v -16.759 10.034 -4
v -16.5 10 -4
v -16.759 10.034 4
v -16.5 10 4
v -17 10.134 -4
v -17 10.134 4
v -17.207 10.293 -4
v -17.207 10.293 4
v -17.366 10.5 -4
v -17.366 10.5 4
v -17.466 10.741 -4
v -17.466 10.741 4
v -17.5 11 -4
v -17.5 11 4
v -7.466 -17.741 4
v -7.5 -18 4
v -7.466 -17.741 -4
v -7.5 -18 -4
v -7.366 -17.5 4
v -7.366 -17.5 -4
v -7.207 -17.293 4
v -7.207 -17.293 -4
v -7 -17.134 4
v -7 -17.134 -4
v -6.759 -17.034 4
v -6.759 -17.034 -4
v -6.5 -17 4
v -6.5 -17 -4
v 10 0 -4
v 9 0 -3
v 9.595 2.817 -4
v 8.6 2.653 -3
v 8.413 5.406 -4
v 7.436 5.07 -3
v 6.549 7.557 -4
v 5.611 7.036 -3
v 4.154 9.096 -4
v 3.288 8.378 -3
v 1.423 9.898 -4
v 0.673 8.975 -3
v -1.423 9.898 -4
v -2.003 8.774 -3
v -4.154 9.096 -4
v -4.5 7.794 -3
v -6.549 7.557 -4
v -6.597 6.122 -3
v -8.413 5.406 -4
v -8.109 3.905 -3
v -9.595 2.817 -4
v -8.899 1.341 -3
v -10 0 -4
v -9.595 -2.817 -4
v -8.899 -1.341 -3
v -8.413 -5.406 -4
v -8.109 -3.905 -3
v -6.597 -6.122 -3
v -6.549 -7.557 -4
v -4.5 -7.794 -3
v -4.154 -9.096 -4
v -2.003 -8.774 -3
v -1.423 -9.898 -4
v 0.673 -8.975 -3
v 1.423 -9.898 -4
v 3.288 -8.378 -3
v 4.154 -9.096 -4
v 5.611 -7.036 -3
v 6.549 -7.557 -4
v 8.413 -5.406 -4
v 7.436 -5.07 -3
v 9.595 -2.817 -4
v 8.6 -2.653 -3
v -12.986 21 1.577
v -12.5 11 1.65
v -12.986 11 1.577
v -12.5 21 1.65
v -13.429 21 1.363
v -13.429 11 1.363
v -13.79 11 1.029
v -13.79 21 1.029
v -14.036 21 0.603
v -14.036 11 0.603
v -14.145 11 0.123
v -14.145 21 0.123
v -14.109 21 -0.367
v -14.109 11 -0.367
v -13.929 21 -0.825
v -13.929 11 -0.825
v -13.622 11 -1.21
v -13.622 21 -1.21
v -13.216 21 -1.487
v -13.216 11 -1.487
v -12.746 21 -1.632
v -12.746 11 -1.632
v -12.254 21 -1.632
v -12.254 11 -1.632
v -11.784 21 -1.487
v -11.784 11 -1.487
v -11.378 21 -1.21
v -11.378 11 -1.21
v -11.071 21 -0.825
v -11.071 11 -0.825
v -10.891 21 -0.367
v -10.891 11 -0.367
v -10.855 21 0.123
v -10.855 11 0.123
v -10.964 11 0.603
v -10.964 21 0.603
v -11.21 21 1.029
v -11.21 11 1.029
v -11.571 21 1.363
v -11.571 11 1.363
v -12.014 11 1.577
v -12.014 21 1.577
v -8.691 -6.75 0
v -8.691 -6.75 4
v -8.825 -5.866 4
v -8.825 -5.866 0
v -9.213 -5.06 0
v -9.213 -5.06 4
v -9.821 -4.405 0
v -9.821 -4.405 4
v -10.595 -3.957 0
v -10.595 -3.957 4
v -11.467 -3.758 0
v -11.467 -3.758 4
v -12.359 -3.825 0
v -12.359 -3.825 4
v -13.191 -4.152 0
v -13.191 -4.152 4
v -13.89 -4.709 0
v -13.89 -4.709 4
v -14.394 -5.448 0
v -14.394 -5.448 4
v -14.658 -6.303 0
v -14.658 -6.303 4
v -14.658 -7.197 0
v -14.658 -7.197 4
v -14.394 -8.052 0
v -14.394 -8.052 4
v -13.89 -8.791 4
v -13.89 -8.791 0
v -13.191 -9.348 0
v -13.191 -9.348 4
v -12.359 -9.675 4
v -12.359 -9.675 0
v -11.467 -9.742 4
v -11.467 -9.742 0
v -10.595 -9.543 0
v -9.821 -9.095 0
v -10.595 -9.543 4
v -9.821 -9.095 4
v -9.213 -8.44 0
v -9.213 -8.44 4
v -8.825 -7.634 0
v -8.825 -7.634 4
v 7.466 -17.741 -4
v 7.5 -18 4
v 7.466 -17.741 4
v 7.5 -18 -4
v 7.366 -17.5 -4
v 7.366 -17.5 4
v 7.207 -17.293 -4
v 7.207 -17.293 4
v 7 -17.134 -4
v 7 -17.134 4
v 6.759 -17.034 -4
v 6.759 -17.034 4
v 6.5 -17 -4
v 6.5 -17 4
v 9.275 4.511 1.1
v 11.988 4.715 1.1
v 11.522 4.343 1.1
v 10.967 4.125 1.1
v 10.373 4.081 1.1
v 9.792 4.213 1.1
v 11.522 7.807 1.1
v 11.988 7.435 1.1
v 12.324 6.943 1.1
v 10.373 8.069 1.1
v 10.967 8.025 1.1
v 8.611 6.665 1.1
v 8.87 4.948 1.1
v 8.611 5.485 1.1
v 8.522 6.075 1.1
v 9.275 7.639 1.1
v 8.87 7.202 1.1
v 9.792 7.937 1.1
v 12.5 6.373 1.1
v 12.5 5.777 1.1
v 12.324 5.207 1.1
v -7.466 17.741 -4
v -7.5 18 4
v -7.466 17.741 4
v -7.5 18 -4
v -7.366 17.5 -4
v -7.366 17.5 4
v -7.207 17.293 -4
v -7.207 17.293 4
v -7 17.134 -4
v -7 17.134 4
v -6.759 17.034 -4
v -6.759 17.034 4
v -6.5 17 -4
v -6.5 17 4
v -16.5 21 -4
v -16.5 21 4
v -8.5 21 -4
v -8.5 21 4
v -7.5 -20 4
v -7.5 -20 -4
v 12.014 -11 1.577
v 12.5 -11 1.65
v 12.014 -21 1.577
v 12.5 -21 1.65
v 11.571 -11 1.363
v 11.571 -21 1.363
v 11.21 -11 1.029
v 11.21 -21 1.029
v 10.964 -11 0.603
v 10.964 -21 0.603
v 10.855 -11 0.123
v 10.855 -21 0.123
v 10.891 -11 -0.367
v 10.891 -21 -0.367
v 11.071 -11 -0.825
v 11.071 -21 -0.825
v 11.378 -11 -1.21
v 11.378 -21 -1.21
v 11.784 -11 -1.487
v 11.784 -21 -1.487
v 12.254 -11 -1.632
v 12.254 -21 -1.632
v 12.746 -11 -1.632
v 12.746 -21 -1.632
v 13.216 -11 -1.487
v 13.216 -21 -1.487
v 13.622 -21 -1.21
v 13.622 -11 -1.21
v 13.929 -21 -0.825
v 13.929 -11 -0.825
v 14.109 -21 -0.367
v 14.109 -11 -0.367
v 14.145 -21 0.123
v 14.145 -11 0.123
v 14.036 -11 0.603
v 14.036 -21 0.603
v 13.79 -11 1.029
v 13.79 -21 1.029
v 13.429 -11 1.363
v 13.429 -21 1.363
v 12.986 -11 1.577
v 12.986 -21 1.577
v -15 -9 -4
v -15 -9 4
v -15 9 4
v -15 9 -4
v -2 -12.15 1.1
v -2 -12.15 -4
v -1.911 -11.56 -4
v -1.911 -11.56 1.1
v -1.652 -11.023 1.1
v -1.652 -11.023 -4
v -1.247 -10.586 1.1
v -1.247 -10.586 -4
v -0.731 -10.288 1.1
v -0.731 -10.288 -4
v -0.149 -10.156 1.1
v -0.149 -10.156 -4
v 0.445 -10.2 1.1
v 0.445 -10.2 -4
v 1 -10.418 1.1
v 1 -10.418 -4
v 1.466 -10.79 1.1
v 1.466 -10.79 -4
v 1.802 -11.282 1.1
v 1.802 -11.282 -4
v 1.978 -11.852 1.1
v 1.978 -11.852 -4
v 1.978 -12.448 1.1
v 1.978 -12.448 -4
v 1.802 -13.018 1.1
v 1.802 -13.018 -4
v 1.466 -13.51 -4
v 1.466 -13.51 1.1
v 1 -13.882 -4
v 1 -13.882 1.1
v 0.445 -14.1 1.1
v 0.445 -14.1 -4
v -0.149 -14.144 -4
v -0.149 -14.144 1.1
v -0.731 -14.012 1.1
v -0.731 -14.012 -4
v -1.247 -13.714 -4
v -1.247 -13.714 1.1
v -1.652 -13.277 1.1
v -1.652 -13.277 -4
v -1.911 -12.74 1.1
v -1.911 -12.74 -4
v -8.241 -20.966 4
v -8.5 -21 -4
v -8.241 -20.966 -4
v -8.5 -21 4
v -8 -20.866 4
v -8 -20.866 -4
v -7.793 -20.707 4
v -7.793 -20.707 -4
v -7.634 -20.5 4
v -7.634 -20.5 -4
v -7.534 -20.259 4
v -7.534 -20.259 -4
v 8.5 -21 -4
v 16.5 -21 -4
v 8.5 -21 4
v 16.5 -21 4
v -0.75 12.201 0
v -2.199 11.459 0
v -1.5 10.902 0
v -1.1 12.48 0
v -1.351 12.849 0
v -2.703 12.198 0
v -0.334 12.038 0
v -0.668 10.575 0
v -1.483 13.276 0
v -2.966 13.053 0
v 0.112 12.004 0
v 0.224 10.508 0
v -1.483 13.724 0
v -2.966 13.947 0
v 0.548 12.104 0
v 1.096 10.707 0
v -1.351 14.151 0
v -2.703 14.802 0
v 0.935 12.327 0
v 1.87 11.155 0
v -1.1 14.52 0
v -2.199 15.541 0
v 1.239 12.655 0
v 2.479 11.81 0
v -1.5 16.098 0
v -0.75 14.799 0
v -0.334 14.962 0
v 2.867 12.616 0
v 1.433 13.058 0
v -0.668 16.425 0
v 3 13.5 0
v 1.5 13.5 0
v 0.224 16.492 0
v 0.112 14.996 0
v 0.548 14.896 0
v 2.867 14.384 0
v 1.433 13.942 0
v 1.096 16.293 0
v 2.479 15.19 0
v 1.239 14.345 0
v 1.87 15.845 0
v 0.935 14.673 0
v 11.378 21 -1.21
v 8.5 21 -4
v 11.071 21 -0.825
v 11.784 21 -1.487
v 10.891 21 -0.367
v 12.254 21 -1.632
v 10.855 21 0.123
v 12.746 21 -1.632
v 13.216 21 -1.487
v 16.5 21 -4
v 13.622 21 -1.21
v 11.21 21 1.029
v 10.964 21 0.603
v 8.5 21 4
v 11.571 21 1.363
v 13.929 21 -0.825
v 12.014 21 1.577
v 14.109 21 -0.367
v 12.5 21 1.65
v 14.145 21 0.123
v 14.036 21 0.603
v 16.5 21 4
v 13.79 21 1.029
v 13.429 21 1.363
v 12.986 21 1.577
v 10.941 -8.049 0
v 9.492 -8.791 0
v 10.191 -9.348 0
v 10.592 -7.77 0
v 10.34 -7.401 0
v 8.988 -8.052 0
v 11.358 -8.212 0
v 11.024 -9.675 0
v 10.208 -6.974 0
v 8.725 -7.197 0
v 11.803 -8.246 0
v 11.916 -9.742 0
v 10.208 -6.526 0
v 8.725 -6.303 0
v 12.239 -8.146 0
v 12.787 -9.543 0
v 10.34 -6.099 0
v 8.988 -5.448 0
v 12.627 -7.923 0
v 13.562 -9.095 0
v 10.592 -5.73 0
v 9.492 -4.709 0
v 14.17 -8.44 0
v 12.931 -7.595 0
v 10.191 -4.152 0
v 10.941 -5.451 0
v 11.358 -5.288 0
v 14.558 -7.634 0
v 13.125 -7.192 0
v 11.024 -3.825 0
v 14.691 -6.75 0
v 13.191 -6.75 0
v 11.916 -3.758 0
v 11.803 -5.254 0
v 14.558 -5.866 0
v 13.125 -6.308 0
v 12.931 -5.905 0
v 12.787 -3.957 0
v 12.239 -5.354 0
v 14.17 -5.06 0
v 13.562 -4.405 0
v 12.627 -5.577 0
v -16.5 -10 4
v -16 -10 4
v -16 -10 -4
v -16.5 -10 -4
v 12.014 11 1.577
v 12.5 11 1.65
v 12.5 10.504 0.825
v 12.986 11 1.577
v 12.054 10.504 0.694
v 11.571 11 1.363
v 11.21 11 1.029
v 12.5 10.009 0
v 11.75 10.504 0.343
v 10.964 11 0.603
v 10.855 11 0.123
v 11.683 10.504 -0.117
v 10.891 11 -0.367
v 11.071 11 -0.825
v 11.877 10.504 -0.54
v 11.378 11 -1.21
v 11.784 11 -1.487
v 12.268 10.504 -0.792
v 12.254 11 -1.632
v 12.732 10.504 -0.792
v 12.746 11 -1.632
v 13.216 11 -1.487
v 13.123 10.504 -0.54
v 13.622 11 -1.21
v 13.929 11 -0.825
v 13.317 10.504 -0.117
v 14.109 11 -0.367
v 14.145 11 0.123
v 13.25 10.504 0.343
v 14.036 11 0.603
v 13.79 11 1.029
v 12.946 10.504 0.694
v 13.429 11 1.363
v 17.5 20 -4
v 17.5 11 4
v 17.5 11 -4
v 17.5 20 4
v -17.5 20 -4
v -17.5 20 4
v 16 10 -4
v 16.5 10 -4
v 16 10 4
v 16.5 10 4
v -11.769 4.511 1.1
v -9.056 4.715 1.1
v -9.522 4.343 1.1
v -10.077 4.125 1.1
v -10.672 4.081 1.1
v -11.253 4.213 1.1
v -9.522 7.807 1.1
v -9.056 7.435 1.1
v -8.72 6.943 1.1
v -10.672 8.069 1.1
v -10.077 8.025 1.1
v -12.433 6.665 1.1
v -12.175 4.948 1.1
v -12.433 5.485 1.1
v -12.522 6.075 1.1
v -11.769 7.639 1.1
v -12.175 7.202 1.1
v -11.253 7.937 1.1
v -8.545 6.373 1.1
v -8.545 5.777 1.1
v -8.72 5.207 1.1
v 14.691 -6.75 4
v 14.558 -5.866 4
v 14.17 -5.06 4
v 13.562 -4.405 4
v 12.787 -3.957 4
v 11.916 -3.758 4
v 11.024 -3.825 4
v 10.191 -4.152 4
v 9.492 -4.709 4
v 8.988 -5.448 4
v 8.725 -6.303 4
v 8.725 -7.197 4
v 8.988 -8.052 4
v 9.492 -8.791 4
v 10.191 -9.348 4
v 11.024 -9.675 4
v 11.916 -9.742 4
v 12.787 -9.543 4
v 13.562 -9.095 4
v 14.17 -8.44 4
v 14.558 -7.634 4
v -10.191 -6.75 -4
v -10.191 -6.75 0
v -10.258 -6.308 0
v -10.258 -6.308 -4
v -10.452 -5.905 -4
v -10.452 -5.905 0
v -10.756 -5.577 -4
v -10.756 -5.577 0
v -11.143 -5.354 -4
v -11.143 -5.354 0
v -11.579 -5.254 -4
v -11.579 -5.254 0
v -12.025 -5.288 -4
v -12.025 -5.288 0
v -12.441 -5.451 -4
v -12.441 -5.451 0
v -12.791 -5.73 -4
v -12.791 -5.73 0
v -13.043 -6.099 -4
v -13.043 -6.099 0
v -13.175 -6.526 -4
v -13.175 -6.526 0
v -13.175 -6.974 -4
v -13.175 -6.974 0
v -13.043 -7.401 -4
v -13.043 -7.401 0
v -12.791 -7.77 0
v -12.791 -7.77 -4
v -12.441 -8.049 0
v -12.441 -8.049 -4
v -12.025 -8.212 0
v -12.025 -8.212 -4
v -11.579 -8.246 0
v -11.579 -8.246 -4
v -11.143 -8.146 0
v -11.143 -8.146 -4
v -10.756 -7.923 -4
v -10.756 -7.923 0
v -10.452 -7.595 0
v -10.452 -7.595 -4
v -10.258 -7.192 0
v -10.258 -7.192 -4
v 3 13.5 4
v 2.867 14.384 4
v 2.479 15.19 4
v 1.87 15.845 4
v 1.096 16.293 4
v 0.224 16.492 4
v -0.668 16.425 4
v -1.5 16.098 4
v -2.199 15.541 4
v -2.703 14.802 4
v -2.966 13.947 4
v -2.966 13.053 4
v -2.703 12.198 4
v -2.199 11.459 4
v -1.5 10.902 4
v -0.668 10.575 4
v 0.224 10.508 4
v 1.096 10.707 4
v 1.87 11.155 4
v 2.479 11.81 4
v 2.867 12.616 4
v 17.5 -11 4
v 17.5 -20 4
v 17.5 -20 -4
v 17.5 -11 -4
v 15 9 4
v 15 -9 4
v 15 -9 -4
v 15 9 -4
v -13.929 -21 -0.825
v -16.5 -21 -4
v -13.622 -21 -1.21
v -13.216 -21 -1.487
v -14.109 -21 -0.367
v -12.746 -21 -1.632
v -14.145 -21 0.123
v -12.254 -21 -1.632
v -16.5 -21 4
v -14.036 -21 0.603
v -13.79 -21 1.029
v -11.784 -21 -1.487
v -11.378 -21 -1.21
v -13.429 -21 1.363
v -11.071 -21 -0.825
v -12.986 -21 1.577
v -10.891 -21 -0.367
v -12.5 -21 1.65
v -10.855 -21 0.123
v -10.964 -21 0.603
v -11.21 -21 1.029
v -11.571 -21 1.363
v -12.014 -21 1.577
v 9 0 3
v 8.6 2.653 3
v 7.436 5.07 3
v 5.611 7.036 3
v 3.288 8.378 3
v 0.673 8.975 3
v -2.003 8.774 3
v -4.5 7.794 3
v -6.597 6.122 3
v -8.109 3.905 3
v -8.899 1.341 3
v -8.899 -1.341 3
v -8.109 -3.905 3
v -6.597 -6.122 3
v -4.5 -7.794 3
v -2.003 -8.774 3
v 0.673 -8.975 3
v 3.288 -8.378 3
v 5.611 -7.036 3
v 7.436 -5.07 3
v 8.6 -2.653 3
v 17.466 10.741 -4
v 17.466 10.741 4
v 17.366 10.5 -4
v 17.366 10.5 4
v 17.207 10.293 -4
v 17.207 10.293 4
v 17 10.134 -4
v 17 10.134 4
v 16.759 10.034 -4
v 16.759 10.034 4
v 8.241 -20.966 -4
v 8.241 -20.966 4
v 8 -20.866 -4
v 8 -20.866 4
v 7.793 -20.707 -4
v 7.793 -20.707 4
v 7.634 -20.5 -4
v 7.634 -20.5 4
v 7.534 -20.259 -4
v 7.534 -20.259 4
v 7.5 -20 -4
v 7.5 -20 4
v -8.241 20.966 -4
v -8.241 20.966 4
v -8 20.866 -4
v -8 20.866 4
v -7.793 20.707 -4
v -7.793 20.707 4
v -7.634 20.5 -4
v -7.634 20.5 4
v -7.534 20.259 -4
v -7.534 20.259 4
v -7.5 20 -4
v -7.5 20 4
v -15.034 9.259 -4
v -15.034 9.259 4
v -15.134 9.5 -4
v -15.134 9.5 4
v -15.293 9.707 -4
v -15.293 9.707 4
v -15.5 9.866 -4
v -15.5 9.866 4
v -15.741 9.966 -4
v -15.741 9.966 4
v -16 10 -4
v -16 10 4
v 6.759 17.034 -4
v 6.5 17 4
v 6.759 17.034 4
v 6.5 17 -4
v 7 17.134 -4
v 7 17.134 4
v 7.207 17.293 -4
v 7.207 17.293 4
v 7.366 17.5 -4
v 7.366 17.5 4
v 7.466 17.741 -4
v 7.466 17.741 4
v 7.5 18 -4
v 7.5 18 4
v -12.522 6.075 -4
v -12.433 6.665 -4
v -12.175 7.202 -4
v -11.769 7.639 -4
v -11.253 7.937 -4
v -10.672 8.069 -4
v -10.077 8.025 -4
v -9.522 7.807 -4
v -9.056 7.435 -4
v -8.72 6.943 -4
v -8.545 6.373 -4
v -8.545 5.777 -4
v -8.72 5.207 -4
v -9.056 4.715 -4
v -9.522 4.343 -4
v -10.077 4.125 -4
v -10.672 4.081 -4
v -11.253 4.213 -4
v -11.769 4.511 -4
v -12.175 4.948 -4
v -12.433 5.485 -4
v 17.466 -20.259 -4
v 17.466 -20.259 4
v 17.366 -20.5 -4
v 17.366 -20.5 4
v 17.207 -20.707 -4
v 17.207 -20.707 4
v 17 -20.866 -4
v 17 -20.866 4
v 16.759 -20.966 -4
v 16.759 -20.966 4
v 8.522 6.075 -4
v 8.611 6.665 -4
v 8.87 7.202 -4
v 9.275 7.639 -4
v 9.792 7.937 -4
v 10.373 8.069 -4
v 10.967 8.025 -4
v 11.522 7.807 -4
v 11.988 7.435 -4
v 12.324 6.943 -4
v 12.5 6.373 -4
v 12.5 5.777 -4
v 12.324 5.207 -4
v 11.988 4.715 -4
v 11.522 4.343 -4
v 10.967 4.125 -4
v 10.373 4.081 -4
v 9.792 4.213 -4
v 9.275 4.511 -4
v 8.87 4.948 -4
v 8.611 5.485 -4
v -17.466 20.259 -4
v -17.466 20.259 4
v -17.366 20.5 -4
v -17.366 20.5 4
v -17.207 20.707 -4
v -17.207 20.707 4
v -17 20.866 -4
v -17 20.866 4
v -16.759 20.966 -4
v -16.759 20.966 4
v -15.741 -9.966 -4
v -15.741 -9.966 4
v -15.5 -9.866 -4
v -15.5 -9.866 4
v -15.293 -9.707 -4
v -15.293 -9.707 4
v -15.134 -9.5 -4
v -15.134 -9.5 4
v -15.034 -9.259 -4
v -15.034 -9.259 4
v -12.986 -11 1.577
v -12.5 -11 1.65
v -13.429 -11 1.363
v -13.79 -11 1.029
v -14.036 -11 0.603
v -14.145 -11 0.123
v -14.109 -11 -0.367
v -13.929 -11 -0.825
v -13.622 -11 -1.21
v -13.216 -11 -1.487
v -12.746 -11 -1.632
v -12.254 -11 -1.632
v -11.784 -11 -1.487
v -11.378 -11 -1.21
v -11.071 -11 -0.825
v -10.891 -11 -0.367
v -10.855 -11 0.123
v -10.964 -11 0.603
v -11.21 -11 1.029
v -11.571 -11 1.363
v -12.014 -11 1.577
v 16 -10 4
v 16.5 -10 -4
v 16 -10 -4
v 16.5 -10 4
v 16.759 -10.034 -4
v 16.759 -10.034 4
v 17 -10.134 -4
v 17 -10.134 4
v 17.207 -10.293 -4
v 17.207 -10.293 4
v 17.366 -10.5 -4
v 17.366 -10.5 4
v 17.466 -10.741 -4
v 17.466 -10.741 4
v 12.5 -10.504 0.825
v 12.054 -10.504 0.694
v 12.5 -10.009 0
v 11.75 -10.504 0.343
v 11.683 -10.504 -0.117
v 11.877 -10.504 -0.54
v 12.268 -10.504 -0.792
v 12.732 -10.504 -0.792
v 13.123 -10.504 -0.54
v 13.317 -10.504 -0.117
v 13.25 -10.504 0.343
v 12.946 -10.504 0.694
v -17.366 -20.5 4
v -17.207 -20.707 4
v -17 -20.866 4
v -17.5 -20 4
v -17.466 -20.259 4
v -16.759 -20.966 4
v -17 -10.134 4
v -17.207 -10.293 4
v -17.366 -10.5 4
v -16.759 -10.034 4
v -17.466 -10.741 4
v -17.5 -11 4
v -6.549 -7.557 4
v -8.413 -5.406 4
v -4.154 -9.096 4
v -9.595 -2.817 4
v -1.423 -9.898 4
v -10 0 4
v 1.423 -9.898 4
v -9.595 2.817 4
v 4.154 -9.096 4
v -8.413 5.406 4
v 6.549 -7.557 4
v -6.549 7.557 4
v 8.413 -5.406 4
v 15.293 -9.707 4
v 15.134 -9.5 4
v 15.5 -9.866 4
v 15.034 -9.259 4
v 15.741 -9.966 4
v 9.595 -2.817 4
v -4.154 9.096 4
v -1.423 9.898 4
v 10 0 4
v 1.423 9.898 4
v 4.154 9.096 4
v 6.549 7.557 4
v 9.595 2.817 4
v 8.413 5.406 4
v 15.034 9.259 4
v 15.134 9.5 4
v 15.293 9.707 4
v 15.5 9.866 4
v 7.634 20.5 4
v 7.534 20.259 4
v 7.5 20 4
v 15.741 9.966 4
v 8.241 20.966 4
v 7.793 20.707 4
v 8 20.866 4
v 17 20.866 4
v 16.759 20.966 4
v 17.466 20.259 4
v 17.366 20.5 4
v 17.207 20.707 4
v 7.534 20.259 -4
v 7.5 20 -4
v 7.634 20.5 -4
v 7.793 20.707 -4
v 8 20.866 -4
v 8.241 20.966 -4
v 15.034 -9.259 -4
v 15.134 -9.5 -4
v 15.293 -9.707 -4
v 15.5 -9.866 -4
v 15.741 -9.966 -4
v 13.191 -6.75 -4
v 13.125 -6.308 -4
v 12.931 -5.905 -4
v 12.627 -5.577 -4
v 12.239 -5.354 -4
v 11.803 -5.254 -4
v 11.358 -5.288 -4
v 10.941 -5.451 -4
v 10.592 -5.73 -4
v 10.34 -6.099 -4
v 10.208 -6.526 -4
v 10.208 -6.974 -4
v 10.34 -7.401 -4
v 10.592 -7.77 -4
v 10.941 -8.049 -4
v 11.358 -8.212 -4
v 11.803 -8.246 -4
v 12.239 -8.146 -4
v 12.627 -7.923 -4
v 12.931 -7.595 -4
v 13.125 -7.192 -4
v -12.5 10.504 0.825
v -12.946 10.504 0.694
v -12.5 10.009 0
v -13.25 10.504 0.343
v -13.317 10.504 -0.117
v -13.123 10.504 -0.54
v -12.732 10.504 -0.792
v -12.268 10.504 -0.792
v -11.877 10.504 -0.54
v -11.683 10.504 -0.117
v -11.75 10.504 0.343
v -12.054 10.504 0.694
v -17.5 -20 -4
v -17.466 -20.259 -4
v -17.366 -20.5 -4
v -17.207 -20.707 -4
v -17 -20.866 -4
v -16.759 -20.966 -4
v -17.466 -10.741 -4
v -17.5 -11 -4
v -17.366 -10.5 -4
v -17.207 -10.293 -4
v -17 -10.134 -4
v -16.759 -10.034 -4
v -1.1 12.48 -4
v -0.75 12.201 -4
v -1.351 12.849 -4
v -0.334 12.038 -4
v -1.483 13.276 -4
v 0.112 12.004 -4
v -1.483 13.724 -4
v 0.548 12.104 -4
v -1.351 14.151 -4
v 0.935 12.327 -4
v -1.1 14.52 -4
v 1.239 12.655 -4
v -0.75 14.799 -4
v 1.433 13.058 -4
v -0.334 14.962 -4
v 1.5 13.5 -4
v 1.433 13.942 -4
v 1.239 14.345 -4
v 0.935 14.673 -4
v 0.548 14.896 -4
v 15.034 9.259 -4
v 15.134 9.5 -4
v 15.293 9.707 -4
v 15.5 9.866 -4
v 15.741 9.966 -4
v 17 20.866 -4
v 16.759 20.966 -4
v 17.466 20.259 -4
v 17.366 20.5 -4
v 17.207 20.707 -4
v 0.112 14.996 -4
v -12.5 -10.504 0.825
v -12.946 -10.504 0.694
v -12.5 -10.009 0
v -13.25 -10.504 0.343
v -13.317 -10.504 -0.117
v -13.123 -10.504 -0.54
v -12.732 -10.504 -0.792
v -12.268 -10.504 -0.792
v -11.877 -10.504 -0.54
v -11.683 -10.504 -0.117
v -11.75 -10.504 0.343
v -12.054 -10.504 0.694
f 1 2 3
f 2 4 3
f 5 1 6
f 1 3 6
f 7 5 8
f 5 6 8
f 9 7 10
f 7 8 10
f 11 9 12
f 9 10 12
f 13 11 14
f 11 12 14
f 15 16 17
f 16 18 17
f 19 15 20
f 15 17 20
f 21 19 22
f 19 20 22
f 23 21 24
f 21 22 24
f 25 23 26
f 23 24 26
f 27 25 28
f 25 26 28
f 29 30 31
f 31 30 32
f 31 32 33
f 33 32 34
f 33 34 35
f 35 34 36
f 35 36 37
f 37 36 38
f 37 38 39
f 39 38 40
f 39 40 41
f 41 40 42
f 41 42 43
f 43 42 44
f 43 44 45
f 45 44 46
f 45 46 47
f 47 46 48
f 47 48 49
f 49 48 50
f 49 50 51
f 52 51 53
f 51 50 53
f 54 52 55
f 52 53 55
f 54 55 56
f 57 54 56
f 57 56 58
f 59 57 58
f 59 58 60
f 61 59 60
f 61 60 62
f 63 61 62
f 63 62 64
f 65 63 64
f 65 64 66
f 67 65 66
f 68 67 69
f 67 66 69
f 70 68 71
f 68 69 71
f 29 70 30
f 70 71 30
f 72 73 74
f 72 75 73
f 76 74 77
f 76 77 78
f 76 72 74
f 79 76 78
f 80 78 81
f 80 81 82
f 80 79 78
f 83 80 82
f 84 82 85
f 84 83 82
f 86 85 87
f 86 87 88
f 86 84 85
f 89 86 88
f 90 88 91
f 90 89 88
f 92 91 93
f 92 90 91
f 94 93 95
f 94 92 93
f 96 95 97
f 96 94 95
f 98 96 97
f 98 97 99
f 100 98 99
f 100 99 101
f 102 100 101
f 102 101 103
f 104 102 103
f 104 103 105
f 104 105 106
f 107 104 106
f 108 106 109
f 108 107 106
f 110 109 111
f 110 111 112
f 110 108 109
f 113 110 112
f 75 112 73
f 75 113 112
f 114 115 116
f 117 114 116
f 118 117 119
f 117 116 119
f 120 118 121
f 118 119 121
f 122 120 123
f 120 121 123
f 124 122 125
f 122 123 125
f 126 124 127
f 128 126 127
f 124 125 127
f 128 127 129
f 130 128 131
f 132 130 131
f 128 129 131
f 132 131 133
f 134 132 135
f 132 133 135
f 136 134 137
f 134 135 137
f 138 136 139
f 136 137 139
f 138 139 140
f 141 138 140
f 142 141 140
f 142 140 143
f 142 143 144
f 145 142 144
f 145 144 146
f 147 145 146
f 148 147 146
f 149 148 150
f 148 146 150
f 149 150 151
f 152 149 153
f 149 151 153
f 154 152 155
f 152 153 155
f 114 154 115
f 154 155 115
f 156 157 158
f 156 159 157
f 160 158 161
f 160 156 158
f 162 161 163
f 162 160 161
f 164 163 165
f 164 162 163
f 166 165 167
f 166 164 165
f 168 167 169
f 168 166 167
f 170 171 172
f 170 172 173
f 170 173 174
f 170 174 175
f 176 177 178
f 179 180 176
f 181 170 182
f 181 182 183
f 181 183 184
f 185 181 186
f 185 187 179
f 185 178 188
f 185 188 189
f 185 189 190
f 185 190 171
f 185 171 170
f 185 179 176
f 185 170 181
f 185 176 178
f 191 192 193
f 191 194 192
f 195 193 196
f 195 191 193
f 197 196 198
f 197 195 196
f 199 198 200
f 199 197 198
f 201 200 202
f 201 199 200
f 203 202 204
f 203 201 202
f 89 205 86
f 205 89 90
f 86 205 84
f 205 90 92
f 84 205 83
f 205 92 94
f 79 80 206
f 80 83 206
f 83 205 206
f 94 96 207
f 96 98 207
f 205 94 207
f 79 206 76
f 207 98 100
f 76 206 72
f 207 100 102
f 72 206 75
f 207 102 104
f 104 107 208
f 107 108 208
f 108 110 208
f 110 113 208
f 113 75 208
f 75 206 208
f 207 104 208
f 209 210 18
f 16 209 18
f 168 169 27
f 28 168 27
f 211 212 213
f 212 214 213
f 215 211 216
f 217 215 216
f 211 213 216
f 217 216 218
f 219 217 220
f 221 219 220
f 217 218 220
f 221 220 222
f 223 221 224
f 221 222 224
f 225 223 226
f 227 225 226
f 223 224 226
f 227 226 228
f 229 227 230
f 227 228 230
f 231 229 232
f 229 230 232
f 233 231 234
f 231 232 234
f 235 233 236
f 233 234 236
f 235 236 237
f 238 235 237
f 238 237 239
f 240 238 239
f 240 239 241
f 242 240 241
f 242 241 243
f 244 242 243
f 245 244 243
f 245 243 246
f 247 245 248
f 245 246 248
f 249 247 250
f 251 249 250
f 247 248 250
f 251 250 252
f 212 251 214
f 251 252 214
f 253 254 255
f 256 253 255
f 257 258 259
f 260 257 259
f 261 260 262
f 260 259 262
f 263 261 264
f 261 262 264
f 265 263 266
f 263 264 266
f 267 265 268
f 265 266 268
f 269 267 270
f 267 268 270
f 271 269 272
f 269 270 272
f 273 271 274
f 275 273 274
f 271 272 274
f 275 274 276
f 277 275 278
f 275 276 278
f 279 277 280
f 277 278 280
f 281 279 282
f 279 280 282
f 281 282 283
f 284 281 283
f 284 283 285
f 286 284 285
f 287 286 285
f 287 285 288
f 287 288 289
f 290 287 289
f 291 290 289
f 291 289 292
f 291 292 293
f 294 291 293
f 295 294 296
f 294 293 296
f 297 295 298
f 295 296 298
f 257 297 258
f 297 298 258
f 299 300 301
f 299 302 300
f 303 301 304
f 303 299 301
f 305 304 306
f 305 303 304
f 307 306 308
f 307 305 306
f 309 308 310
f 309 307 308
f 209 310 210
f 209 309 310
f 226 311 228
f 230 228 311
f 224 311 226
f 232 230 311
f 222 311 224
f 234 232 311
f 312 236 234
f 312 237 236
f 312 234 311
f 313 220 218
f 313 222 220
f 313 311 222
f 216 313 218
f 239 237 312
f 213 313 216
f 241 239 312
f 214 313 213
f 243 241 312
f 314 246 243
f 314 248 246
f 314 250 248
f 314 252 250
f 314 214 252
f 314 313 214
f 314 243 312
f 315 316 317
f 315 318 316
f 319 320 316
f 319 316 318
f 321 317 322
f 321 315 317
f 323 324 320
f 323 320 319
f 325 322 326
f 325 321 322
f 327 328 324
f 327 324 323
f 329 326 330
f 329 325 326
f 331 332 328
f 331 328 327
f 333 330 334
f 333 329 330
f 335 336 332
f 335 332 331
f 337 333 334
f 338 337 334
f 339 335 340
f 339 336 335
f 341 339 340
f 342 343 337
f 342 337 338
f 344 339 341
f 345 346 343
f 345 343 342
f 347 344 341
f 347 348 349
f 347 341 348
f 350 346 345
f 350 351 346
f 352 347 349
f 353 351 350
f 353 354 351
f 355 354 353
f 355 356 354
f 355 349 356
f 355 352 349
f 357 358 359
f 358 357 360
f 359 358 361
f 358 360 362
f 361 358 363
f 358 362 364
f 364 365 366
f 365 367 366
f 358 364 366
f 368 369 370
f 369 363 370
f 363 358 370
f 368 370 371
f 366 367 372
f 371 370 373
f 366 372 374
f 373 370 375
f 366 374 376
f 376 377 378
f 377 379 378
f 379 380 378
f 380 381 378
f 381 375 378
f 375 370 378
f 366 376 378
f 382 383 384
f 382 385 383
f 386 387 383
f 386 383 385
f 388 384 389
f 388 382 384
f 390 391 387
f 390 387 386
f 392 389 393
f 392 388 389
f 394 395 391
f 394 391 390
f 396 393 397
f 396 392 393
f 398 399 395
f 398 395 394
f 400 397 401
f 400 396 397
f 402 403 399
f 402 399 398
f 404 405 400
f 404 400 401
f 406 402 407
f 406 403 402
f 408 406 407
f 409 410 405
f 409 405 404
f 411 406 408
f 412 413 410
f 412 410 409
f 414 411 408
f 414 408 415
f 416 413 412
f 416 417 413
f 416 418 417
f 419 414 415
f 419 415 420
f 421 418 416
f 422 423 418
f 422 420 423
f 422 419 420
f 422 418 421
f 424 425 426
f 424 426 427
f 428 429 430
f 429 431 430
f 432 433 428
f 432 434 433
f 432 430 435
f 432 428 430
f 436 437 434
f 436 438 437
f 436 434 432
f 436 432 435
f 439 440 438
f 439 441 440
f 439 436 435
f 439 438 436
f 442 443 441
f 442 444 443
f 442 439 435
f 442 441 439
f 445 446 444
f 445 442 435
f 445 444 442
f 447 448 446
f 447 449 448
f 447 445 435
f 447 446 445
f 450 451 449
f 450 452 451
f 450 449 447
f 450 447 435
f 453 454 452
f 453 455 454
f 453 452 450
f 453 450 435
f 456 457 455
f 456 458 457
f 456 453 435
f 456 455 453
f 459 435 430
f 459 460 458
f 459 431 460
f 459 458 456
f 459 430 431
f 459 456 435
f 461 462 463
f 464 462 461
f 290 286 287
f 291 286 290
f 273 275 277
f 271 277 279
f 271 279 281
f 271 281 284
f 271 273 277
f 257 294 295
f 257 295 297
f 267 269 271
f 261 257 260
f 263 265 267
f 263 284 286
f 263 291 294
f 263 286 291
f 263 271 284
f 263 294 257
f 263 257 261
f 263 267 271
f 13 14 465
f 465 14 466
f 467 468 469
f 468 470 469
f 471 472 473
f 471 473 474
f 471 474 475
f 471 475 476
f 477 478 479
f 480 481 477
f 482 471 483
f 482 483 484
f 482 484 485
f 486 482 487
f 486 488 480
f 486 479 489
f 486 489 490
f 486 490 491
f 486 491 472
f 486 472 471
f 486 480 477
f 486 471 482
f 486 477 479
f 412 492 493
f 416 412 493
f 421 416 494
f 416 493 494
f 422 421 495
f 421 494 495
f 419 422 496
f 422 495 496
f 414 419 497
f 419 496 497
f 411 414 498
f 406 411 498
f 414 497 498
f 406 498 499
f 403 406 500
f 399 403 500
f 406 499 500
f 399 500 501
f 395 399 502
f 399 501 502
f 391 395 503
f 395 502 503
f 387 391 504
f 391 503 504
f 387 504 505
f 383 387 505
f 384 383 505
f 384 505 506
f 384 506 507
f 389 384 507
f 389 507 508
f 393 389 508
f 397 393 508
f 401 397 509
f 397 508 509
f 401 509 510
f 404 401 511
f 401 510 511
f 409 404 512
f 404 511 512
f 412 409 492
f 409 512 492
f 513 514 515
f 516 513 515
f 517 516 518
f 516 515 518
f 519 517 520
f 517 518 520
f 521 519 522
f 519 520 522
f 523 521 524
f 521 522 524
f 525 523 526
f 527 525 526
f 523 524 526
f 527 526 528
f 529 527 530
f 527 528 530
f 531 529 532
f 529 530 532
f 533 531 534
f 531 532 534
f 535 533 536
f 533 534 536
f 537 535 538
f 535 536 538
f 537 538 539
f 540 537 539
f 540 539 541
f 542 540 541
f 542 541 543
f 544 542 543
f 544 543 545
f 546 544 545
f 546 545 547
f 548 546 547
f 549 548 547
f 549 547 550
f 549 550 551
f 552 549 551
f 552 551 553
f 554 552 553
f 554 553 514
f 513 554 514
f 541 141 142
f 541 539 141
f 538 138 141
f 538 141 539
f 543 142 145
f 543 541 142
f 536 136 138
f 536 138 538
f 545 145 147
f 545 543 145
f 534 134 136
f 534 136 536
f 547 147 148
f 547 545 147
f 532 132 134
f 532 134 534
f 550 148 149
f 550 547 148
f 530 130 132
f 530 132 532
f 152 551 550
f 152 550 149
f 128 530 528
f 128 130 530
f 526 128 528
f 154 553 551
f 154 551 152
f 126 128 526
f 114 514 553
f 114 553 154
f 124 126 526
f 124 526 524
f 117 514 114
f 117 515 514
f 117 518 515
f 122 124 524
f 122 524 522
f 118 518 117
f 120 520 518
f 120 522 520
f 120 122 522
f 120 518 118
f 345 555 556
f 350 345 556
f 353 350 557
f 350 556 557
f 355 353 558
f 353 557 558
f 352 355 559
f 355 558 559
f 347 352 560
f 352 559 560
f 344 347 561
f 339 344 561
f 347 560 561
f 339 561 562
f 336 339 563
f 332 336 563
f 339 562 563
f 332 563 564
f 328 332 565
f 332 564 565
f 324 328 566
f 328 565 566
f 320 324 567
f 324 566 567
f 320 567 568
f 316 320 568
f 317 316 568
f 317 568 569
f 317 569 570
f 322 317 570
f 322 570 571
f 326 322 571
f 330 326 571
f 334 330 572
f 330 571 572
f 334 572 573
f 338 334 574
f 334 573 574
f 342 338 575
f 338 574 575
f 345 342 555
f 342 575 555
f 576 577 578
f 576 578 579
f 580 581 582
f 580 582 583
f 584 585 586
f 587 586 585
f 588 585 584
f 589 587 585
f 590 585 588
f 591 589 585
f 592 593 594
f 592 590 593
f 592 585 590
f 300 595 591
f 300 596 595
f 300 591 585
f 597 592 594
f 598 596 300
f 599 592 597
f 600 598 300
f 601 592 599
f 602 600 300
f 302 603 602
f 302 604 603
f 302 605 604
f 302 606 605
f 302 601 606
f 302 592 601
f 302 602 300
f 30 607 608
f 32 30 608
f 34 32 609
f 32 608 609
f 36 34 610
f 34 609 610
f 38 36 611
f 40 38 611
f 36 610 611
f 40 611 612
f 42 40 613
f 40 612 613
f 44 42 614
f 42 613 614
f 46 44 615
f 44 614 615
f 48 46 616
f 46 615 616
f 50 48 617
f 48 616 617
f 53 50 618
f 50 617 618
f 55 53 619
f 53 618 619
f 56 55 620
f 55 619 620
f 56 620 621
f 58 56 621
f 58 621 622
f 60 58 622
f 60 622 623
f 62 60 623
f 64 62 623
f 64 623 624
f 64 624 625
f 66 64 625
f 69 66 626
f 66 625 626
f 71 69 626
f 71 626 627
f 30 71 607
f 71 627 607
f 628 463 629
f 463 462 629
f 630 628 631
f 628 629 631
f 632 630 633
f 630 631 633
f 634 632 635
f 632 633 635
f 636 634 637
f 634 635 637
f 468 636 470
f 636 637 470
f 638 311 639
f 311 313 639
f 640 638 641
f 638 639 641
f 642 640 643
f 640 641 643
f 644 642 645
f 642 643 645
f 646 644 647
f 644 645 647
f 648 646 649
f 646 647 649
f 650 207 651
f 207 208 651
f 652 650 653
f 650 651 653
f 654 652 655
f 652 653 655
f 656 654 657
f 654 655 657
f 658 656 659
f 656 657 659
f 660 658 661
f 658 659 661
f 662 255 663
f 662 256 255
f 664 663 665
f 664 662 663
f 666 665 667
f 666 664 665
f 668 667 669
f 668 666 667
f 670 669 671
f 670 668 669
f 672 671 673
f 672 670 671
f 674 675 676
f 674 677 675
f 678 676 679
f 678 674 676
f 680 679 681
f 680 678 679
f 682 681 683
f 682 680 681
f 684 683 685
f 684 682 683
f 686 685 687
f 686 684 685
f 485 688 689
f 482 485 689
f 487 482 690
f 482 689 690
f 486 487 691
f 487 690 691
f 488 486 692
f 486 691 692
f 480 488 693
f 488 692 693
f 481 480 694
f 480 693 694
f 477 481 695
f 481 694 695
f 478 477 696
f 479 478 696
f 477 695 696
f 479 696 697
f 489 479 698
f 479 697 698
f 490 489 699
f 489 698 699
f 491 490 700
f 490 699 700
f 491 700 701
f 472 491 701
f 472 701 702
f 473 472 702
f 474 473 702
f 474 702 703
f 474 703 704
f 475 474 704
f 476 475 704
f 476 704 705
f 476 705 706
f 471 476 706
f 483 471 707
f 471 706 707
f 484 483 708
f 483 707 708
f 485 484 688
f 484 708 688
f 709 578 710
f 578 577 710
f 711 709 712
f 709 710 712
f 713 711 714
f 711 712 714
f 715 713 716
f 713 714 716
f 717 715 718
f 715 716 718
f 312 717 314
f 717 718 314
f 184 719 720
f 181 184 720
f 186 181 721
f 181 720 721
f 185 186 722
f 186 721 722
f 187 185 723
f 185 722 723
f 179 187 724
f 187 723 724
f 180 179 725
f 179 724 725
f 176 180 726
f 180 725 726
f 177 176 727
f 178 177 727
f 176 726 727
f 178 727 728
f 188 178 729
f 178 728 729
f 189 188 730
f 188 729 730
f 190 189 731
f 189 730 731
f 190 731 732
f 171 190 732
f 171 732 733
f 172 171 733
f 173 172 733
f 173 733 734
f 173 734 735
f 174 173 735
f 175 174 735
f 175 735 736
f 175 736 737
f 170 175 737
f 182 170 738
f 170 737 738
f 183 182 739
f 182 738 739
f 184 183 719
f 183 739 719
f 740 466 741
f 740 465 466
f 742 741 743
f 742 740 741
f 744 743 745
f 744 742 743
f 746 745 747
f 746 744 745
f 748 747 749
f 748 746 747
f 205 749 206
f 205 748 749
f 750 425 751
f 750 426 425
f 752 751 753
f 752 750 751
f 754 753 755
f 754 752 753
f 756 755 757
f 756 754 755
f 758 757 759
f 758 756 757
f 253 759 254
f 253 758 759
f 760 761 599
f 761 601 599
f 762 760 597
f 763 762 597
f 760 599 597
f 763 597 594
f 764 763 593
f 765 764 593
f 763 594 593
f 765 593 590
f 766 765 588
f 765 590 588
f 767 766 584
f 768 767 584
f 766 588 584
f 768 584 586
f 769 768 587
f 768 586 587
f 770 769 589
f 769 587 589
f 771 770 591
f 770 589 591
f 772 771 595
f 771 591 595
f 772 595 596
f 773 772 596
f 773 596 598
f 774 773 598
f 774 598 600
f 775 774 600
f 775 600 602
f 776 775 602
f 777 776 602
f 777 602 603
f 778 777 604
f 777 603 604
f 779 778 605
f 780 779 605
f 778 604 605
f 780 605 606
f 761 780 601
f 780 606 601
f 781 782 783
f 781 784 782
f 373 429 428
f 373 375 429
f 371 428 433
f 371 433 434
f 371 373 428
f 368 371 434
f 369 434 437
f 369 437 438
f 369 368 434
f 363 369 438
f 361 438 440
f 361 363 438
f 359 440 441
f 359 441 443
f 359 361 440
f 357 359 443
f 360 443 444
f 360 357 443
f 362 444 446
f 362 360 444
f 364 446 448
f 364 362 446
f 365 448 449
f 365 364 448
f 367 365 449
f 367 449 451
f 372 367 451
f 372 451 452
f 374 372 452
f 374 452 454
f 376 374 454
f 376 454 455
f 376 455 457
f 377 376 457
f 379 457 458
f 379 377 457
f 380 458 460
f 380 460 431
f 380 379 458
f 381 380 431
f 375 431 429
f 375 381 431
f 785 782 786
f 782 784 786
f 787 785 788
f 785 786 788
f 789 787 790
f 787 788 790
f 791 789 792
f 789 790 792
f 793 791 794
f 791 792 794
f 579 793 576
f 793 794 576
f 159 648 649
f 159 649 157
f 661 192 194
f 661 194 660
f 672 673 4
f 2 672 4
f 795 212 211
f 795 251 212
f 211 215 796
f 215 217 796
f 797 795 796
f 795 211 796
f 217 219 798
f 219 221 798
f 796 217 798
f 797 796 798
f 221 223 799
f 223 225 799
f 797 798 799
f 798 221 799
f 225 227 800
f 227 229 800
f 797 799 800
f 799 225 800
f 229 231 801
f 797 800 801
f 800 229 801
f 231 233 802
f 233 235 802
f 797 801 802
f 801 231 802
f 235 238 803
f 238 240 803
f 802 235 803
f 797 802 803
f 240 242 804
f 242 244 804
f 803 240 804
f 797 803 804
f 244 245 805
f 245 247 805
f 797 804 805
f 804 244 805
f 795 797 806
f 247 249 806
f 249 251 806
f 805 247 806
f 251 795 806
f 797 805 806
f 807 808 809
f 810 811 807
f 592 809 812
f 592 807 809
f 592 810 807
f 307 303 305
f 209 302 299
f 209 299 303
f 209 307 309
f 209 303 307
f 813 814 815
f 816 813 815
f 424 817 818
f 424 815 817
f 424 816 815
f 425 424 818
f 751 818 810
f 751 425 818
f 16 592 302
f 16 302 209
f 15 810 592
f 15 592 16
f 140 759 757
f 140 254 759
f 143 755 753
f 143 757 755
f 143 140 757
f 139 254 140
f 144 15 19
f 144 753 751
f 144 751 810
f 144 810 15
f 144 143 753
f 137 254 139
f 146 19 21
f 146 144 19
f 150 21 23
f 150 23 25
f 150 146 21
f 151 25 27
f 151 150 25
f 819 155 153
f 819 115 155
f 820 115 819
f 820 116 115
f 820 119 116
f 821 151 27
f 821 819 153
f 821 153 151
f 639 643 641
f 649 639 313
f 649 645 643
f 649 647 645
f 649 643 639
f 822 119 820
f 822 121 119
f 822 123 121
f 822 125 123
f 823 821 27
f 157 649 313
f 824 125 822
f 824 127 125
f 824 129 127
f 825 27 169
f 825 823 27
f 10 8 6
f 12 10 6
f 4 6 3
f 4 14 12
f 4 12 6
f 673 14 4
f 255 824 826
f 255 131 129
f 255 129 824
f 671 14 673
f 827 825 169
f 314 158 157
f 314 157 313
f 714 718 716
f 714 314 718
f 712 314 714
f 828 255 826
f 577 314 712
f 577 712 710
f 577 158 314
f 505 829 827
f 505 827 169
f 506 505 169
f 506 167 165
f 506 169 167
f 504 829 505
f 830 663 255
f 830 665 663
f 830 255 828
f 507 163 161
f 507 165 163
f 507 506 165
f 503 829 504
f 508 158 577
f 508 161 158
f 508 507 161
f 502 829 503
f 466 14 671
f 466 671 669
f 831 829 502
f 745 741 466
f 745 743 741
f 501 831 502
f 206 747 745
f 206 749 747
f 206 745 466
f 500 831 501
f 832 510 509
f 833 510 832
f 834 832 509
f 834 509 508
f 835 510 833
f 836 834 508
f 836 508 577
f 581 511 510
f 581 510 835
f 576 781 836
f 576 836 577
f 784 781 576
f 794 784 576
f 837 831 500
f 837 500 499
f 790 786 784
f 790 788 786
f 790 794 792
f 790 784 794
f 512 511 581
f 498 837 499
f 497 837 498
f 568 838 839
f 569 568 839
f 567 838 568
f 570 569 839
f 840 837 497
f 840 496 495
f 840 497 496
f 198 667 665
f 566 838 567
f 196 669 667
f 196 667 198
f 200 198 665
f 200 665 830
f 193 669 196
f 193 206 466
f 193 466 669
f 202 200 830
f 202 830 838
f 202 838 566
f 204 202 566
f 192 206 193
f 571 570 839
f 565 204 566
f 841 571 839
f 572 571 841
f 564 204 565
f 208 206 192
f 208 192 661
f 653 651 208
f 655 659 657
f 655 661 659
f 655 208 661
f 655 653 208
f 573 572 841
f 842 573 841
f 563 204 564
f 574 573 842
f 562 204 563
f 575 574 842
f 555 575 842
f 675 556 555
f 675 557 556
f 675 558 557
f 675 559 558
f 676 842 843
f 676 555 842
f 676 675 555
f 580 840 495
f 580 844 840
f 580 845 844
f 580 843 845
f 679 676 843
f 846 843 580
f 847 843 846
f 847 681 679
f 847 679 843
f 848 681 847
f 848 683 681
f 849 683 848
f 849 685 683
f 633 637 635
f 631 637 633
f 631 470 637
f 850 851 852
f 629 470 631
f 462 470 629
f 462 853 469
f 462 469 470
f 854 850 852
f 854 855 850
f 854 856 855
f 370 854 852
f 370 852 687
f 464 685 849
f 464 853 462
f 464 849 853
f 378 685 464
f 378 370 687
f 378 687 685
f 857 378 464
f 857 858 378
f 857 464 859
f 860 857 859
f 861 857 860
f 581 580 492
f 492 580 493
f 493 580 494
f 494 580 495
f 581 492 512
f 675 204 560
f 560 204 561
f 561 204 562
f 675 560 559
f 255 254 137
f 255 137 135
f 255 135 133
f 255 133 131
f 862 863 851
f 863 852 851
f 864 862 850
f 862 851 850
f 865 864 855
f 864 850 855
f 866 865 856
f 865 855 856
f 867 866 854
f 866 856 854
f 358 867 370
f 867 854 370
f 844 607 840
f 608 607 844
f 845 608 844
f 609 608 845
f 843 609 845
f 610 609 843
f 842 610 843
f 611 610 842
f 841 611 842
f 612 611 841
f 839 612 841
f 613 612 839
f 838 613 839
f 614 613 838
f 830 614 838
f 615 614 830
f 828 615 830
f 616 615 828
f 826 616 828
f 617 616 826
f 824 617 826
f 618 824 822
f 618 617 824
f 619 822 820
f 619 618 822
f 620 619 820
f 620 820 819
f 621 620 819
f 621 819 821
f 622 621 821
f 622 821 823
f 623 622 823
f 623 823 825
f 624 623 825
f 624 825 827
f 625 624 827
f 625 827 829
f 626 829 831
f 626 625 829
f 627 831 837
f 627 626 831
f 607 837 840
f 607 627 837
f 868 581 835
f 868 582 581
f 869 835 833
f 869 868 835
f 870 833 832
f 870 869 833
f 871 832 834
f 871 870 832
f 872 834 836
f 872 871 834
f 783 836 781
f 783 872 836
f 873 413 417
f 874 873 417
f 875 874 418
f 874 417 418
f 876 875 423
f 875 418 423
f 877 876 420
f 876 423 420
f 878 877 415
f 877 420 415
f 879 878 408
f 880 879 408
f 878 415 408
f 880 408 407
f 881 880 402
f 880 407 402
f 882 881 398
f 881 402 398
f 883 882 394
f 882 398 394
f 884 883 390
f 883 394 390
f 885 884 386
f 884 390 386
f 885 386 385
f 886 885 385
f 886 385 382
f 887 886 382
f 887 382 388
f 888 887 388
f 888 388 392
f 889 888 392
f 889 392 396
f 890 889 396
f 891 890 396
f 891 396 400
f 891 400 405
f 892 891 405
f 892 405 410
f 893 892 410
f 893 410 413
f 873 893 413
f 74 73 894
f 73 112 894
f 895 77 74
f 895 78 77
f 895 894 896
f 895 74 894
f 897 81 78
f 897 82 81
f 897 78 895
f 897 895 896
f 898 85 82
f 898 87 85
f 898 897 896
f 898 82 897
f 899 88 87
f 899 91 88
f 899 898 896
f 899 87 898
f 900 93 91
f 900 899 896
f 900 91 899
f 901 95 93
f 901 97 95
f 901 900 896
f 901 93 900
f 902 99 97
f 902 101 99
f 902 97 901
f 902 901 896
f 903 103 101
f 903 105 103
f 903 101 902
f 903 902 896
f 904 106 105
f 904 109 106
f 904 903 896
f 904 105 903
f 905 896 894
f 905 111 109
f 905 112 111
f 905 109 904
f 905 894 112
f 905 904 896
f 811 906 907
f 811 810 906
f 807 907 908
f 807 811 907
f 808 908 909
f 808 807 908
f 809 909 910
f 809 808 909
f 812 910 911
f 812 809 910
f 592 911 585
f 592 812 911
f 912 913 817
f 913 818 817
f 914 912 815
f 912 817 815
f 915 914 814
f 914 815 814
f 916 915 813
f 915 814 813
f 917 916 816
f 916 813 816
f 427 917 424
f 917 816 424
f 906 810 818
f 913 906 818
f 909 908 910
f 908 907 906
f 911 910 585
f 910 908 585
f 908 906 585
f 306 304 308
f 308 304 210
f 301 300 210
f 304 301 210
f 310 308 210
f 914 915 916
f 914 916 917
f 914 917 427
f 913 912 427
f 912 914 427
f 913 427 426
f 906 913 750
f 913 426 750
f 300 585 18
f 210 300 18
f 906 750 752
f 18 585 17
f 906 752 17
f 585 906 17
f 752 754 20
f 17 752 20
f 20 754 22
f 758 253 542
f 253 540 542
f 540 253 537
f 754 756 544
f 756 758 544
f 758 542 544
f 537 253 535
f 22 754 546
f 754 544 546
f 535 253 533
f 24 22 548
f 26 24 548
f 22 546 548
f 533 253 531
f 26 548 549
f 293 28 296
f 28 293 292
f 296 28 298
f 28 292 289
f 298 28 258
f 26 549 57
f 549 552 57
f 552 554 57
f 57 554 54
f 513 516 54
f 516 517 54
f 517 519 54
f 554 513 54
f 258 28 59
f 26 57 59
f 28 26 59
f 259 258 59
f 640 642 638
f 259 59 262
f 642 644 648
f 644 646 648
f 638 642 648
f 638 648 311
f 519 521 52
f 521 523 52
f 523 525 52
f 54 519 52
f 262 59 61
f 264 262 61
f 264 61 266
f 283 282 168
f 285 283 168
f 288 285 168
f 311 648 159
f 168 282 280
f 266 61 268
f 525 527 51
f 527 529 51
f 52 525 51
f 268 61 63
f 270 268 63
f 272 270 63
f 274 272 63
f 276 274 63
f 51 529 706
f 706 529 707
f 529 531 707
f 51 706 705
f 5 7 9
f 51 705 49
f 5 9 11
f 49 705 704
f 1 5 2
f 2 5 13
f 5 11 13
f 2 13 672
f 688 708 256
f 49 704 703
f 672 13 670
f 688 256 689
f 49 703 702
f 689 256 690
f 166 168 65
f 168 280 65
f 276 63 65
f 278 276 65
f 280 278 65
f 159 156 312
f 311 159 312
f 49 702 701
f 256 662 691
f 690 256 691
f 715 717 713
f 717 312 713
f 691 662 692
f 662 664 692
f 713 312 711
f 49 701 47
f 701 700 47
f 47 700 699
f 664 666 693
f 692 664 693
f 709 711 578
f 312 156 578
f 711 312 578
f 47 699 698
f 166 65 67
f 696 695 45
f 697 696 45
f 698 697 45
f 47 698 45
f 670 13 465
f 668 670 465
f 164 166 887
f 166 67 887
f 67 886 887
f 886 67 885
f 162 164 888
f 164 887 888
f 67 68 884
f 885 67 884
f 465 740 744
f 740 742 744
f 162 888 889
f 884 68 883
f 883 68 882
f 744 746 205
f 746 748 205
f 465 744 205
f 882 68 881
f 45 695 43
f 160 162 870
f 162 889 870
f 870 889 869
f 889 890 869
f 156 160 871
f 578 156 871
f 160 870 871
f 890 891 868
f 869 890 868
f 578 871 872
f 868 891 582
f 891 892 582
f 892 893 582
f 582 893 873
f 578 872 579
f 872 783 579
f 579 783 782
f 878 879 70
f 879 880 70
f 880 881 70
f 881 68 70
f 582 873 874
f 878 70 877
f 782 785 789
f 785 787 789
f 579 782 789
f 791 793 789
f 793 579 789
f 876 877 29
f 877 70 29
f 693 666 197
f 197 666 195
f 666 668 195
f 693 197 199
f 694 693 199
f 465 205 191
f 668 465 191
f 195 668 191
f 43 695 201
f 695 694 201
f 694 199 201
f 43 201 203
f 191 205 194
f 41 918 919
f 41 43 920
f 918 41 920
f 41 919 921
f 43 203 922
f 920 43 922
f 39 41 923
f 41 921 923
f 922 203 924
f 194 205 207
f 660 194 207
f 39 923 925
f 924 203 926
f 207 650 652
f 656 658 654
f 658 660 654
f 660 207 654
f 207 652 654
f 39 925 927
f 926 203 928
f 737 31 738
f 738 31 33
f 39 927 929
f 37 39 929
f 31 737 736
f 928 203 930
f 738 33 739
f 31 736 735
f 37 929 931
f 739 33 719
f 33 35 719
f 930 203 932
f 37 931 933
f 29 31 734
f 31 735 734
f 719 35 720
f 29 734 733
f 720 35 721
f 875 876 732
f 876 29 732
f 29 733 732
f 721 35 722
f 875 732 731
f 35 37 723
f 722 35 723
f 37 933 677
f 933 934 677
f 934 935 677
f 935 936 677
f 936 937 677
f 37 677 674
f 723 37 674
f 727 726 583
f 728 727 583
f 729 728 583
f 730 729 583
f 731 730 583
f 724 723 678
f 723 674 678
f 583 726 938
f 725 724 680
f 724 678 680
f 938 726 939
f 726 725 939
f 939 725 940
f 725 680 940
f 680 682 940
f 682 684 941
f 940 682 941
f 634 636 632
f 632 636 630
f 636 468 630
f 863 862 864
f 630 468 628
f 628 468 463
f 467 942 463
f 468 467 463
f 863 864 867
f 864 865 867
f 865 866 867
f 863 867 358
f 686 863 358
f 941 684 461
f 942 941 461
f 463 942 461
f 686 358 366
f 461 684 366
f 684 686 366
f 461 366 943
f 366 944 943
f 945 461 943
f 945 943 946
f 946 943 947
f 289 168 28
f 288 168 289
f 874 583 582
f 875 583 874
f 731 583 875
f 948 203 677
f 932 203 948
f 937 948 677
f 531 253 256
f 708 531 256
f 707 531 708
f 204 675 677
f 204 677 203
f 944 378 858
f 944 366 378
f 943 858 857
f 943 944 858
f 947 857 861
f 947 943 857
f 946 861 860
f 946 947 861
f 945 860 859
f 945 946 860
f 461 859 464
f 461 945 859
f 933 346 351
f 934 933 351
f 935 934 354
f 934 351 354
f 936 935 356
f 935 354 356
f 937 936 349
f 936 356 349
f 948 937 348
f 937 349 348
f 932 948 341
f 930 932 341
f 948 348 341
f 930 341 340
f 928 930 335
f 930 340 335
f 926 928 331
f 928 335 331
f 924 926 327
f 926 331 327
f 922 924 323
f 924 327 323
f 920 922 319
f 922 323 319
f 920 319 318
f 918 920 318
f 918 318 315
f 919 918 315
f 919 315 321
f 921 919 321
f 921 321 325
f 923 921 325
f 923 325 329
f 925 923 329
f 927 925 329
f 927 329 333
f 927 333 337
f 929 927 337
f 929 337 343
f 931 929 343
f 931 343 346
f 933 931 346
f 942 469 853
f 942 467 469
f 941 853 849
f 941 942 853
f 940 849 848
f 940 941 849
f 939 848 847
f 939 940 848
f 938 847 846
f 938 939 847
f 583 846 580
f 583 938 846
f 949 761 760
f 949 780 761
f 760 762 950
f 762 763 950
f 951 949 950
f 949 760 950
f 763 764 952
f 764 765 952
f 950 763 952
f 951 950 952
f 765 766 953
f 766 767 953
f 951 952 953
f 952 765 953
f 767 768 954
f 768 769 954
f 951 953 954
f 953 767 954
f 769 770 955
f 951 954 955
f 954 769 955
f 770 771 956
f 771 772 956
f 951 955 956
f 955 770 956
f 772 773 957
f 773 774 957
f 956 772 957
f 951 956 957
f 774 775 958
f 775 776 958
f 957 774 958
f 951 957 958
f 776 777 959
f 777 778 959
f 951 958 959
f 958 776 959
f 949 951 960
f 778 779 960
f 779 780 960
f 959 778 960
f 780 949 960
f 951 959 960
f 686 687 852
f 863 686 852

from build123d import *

# Parameters (mm, degrees)
SKETCH_1_W                  = 35
SKETCH_1_H                  = 42
EXTRUDE_1_DEPTH             = 4
SKETCH_2_R                  = 1.5
SKETCH_2_R_2                = 9
CUT_EXTRUDE_1_DEPTH         = 8
SKETCH_3_R                  = 3
CUT_EXTRUDE_2_DEPTH         = 4
HOLE_WIZARD_M4_1_AT_2_COUNT = 2
HOLE_WIZARD_M4_1_AT_2_PITCH = 25
SKETCH_9_R                  = 2
CUT_EXTRUDE_3_DEPTH         = 5.1
CUT_EXTRUDE_4_DEPTH         = 29.482450737
CUT_EXTRUDE_4_DEPTH_BACK    = 29.482450737
SKETCH_10_W                 = 15
SKETCH_10_H                 = 8
SKETCH_10_W_2               = 5
SKETCH_10_H_2               = 20
FILLET_2_R                  = 1
CHAMFER_1_SIZE              = 1


with BuildPart() as part:
    # 草图1 → 凸台-拉伸1 (new, symmetric)
    with BuildSketch(Plane.XY):
        Rectangle(SKETCH_1_W, SKETCH_1_H)
    extrude(amount=EXTRUDE_1_DEPTH, both=True)

    # 草图2 → 切除-拉伸1 (cut)
    with BuildSketch(Plane.XY.offset(4)):
        with Locations((0, 13.5)):
            Circle(SKETCH_2_R)
        with Locations((11.691342951, -6.75)):
            Circle(SKETCH_2_R)
        with Locations((-11.691342951, -6.75)):
            Circle(SKETCH_2_R)
        Circle(SKETCH_2_R_2)
    extrude(amount=-CUT_EXTRUDE_1_DEPTH, mode=Mode.SUBTRACT)

    # 草图3 → 切除-拉伸2 (cut)
    with BuildSketch(Plane.XY.offset(4)):
        with Locations((-11.691342951, -6.75)):
            Circle(SKETCH_3_R)
        with Locations((11.691342951, -6.75)):
            Circle(SKETCH_3_R)
        with Locations((0, 13.5)):
            Circle(SKETCH_3_R)
    extrude(amount=-CUT_EXTRUDE_2_DEPTH, mode=Mode.SUBTRACT)

    # 草图8 → M4 螺纹孔1 (revolve, cut)
    with BuildSketch(Plane(origin=(-12.5, 21, 0), x_dir=(0, 0, 1), z_dir=(1, 0, 0))):
        Polygon((0, 0), (0, 10.991420021), (1.65, 10), (1.65, 0), align=None)
    hole_wizard_m4_1 = revolve(axis=Axis((-12.5, 27.35, 0), (0, -1, 0)), mode=Mode.SUBTRACT)

    # M4 螺纹孔1 at 2: M4 螺纹孔1 ×2
    with Locations(*[(i * HOLE_WIZARD_M4_1_AT_2_PITCH, 0, 0) for i in range(1, HOLE_WIZARD_M4_1_AT_2_COUNT)]):
        add(hole_wizard_m4_1, mode=Mode.SUBTRACT)

    # 镜向1: M4 螺纹孔1 across plane
    add(hole_wizard_m4_1.mirror(Plane.ZX), mode=Mode.SUBTRACT)

    # 镜向1 copy 1 sketch → 镜向1 copy 1 (revolve, cut)
    with BuildSketch(Plane(origin=(12.5, -21, 0), x_dir=(0, 0, 1), z_dir=(1, 0, 0))):
        Polygon((0, 0), (0, -10.991420021), (1.65, -10), (1.65, 0), align=None)
    revolve(axis=Axis((12.5, -27.35, 0), (0, -1, 0)), mode=Mode.SUBTRACT)

    # 草图9 → 切除-拉伸3 (cut)
    with BuildSketch(Plane(origin=(0, 0, -4), x_dir=(-1, 0, 0), z_dir=(0, 0, -1))):
        with Locations((0, -12.15)):
            Circle(SKETCH_9_R)
        with Locations((-10.522208656, 6.075)):
            Circle(SKETCH_9_R)
        with Locations((10.522208656, 6.075)):
            Circle(SKETCH_9_R)
    extrude(amount=-CUT_EXTRUDE_3_DEPTH, mode=Mode.SUBTRACT)

    # 草图10 → 切除-拉伸4 (cut, two sides: drawn at the far end of the back side and taken through both)
    with BuildSketch(Plane(origin=(0, 0, -4), x_dir=(-1, 0, 0), z_dir=(0, 0, -1)).offset(-CUT_EXTRUDE_4_DEPTH_BACK)):
        with Locations((0, 21)):
            Rectangle(SKETCH_10_W, SKETCH_10_H)
        with Locations((0, -21)):
            Rectangle(SKETCH_10_W, SKETCH_10_H)
        with Locations((17.5, 0)):
            Rectangle(SKETCH_10_W_2, SKETCH_10_H_2)
        with Locations((-17.5, 0)):
            Rectangle(SKETCH_10_W_2, SKETCH_10_H_2)
    extrude(amount=CUT_EXTRUDE_4_DEPTH + CUT_EXTRUDE_4_DEPTH_BACK, mode=Mode.SUBTRACT)

    # 圆角2
    fillet_2_edges = [part.edges().sort_by_distance(p)[0] for p in [
        (-7.5, 21, 0),
        (-7.5, 17, 0),
        (7.5, 21, 0),
        (7.5, 17, 0),
        (-7.5, -21, 0),
        (-7.5, -17, 0),
        (7.5, -21, 0),
        (7.5, -17, 0),
        (-17.5, -10, 0),
        (-15, -10, 0),
        (-17.5, 10, 0),
        (-15, 10, 0),
        (15, 10, 0),
        (17.5, -10, 0),
        (15, -10, 0),
        (17.5, 10, 0),
        (17.5, -21, 0),
        (-17.5, -21, 0),
        (-17.5, 21, 0),
        (17.5, 21, 0),
    ]]
    fillet(fillet_2_edges, radius=FILLET_2_R)

    # 倒角1
    chamfer_1_edges = [part.edges().sort_by_distance(p)[0] for p in [
        (-9, 0, -4),
        (-9, 0, 4),
    ]]
    chamfer(chamfer_1_edges, length=CHAMFER_1_SIZE)


solid = part.part
